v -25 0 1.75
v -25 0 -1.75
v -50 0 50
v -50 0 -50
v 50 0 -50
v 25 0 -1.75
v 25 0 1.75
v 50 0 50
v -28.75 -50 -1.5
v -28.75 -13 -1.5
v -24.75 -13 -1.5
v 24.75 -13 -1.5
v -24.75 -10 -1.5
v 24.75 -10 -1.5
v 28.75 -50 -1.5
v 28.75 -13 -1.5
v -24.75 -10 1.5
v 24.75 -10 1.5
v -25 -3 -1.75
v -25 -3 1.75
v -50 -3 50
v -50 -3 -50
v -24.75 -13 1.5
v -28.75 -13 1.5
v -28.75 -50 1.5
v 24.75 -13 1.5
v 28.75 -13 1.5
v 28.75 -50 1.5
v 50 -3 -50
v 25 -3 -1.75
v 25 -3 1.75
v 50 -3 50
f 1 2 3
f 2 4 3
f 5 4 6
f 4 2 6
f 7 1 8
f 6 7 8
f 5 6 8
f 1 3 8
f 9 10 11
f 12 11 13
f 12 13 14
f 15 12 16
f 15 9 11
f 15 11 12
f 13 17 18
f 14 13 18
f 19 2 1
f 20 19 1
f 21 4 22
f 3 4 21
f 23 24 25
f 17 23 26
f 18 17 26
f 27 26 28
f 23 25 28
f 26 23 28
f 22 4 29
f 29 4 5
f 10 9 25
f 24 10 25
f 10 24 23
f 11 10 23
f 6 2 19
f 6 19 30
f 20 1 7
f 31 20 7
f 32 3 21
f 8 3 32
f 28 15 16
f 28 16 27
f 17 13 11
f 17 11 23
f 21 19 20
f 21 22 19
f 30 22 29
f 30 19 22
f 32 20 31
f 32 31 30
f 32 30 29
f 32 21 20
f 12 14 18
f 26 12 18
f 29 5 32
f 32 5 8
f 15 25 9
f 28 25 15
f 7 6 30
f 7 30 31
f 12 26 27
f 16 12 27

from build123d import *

# Parameters (mm, degrees)
F0_W     = 100
F0_H     = 100
F0_W_2   = 50
F0_H_2   = 3.5
F1_DEPTH = 3
F3_W     = 49.5
F3_H     = 3
F4_DEPTH = 40
F5_W     = 4
F5_H     = 3
F6_DEPTH = 37


with BuildPart() as f1:
    # F0 (on Front) → F1 (new body)
    with BuildSketch(Plane.XZ):
        Rectangle(F0_W, F0_H)
        Rectangle(F0_W_2, F0_H_2, mode=Mode.SUBTRACT)
    extrude(amount=F1_DEPTH)


with BuildPart() as f4:
    # F3 (on offset) → F4 (new body)
    with BuildSketch(Plane.XZ.offset(10)):
        Rectangle(F3_W, F3_H)
    extrude(amount=F4_DEPTH)

    # F5 (on face) → F6 (join)
    with BuildSketch(Plane.XZ.offset(50)):
        with Locations((-26.75, 0)):
            Rectangle(F5_W, F5_H)
        with Locations((26.75, 0)):
            Rectangle(F5_W, F5_H)
    extrude(amount=-F6_DEPTH)


solid = Compound([f1.part, f4.part])
